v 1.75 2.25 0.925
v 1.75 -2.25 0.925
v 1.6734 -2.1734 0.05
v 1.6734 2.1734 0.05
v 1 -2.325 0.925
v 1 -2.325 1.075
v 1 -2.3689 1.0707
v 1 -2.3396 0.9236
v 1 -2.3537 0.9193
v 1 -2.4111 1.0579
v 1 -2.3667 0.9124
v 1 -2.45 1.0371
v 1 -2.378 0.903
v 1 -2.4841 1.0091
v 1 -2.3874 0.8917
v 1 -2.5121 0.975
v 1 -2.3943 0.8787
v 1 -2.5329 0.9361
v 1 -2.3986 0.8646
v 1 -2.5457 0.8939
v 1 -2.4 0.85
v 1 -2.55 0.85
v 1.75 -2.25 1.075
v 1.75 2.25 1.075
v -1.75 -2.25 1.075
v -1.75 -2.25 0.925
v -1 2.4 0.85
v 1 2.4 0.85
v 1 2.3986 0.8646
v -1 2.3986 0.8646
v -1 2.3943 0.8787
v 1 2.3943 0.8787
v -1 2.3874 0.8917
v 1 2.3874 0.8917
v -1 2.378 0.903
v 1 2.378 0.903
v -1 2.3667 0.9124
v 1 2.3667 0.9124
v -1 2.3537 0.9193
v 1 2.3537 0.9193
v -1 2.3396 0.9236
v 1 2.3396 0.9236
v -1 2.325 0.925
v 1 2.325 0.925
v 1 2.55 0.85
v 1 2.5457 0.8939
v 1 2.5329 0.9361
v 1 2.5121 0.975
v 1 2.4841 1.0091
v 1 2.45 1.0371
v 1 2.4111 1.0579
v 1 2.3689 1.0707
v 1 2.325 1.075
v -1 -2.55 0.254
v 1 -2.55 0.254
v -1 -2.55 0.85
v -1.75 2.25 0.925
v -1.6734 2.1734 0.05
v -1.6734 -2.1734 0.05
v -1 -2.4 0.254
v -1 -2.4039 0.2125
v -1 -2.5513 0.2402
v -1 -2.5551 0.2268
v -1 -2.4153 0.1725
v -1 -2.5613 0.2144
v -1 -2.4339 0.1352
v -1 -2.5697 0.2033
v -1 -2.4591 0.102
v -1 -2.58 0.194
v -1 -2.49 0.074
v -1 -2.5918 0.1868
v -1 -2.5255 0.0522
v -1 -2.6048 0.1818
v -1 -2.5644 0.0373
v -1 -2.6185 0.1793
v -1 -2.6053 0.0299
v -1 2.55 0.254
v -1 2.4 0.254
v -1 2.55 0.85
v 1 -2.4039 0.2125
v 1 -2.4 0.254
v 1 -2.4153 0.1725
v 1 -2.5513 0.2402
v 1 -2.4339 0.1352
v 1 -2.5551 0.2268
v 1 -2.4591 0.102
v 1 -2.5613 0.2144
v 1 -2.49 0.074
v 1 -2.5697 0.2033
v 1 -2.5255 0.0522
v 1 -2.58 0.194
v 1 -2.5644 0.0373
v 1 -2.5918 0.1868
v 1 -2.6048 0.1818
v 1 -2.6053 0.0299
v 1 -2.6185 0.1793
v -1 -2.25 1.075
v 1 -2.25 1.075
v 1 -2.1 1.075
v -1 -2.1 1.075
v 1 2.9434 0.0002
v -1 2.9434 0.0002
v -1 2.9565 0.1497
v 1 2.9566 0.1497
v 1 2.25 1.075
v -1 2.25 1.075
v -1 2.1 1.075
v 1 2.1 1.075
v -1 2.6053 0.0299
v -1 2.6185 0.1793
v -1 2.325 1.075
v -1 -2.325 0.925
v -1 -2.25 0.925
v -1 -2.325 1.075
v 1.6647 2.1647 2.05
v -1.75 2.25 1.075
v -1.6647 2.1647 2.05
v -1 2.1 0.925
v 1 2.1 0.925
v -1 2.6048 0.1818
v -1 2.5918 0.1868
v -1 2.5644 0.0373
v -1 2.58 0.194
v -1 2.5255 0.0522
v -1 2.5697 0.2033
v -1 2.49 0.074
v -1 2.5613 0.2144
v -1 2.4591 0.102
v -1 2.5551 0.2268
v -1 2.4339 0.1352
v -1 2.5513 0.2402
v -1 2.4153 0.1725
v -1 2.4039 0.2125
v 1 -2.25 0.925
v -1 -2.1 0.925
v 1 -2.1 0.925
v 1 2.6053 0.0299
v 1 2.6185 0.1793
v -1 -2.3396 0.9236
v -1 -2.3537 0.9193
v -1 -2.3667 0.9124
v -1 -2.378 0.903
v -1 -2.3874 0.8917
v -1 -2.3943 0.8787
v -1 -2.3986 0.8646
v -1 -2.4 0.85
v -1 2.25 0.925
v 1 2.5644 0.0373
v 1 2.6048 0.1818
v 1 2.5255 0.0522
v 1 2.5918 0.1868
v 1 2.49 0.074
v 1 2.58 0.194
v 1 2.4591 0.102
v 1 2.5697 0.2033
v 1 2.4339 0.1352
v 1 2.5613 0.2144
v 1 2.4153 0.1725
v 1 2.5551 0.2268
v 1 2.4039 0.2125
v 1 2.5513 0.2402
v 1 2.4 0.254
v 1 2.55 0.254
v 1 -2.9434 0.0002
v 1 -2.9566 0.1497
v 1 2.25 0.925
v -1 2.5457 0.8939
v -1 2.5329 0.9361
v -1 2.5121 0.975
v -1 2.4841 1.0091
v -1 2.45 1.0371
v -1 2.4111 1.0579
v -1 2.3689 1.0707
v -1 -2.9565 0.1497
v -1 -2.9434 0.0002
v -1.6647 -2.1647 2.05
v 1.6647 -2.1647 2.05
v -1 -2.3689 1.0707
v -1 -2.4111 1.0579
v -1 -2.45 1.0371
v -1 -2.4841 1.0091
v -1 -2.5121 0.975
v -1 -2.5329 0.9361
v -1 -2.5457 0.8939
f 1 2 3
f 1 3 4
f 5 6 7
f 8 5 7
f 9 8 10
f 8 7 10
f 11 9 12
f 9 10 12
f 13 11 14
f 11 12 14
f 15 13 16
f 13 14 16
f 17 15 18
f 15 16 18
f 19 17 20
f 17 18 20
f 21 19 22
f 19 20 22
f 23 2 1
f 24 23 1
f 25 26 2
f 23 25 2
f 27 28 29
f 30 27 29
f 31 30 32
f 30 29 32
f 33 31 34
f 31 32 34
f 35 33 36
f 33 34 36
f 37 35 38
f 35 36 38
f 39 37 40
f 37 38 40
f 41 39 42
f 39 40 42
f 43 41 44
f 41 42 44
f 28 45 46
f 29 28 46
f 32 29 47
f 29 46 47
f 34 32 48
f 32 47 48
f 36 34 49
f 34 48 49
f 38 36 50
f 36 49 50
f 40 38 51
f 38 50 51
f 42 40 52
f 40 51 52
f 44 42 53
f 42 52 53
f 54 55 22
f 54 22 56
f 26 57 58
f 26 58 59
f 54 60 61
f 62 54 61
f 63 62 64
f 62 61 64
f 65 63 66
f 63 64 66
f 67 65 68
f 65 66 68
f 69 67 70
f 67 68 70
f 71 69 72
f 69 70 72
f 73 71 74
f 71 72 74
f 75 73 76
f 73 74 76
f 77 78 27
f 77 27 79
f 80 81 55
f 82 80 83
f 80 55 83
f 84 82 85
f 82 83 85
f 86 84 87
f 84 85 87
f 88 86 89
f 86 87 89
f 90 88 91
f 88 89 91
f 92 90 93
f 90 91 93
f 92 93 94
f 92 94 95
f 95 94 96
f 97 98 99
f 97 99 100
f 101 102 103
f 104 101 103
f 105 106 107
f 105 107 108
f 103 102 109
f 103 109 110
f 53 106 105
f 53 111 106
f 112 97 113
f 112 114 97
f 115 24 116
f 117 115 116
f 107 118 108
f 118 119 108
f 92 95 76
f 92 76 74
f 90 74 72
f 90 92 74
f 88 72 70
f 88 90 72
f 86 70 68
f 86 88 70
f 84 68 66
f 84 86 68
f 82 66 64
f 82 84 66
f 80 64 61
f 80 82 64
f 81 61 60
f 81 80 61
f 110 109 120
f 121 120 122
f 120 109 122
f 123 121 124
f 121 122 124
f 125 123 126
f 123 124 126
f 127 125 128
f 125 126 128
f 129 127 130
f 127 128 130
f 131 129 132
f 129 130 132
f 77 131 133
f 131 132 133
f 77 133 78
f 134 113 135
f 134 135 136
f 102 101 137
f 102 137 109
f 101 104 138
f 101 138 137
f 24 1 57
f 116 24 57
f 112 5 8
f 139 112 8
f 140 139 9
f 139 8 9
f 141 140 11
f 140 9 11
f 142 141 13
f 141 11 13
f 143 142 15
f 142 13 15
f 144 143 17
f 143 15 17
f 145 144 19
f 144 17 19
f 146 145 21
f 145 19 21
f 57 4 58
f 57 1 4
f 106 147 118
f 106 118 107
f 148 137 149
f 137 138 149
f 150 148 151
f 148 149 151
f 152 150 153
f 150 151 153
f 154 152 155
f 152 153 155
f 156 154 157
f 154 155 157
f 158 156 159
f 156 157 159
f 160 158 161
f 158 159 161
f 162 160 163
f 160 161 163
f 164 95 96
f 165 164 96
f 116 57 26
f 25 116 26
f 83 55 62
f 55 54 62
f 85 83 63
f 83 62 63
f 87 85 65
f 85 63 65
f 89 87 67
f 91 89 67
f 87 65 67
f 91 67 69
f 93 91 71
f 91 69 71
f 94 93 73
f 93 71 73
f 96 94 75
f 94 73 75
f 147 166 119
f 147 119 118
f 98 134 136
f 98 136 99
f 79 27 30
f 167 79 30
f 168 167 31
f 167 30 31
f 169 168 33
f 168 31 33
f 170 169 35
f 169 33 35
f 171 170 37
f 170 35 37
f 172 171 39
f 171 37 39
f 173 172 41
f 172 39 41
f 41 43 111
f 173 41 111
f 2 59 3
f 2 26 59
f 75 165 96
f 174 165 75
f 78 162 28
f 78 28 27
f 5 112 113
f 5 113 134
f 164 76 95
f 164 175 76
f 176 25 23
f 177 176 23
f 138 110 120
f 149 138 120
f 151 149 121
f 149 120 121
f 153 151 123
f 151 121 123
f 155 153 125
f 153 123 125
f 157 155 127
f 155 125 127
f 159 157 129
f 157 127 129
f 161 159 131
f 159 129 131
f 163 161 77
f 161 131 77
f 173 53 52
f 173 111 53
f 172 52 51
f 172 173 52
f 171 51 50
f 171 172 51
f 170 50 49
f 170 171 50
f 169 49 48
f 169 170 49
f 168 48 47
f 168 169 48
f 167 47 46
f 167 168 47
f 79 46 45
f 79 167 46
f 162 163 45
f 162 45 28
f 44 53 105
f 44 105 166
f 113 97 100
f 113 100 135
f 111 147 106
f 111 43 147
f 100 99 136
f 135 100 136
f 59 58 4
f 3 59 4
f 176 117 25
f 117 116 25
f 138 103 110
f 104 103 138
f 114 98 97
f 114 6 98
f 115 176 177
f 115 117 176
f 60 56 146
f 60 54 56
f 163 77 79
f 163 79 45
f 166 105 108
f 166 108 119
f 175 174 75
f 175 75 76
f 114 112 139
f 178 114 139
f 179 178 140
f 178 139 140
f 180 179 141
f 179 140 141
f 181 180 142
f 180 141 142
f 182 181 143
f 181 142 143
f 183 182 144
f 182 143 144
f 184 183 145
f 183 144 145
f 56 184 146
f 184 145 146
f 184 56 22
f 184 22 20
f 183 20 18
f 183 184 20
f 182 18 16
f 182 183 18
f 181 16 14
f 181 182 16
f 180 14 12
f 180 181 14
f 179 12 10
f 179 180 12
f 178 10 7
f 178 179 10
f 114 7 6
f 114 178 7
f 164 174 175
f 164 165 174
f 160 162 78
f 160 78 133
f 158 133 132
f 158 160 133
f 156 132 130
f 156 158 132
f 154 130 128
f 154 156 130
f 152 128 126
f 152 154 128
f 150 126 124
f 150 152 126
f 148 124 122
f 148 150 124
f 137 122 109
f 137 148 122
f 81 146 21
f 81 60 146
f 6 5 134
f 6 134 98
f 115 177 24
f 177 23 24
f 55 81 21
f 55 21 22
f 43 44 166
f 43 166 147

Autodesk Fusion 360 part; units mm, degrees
ref_plane "WorkPlane1" through (0, 0, 0.925) normal (0, 0, 1) x (1, 0, 0)
sketch "Sketch1" plane through (0, 0, 0.925) normal (0, 0, 1) x (1, 0, 0)
  line L0 (1.75, 2.25) -> (-1.75, 2.25)
  line L1 (-1.75, 2.25) -> (-1.75, -2.25)
  line L2 (-1.75, -2.25) -> (1.75, -2.25)
  line L3 (1.75, -2.25) -> (1.75, 2.25)
  line L4 (1.75, 2.25) -> (-1.75, -2.25) construction
  line L5 (-1.75, 2.25) -> (1.75, -2.25) construction
  dimension "d2" = 3.5
  dimension "d3" = 4.5
extrude "Extrude1" add sketch "Sketch1" against normal blind 0.875 draft -5 makes body 1
extrude "Extrude3" add sketch "Sketch1" along normal blind 0.15 bodies 1
extrude "Extrude4" add sketch "Sketch1" along normal blind 0.975 draft -5 from surface at 0.15 bodies 1
sketch "Sketch2" plane through (0, -2.25, 0) normal (0, -1, 0) x (1, 0, 0)
  line L0 (1.4672, 0.1123) -> (1.5, 0.4887)
  line L1 (1, 0.925) -> (-1, 0.925)
  line L2 (-1, 0.925) -> (-1, 1.075)
  line L3 (-1, 1.075) -> (1, 1.075)
  line L4 (1, 1.075) -> (1, 0.925)
  line L5 (1, 0.925) -> (-1, 1.075) construction
  line L6 (-1, 0.925) -> (1, 1.075) construction
  line L7 (-1.75, 0.925) -> (1.75, 0.925)
  line L8 (1.75, 0.925) -> (1.75, 1.075)
  line L9 (1.75, 1.075) -> (-1.75, 1.075)
  line L10 (-1.75, 1.075) -> (-1.75, 0.925)
  point P0 (0, 1)
  dimension "d6" = 2
  dimension "d7" = 0.15
  dimension "d51" = 1
sketch "Sketch3" plane through (0, 0, 0) normal (1, 0, 0) x (0, 1, 0)
  line L0 (-2.25, 1) -> (-2.325, 1)
  arc A0 (-2.325, 1) -> (-2.475, 0.85) centre (-2.325, 0.85) ccw
  line L1 (-2.475, 0.85) -> (-2.475, 0.254)
  arc A1 (-2.6119, 0.1046) -> (-2.475, 0.254) centre (-2.625, 0.254) ccw
  line L2 (-2.6119, 0.1046) -> (-2.95, 0.075)
  line L3 (-2.25, 1.075) -> (-2.25, 0.925)
  line L4 (-2.25, 1) -> (-2.1, 1)
  line L5 (-2.95, 0.075) -> (-2.45, 0.075) construction
  point P0 (-2.25, 1)
  dimension "d10" = 0.15
  dimension "d11" = 0.075
  dimension "d21" = 0.15
  dimension "d22" = 0.225
  dimension "d23" = 0.7
  dimension "d24" = 0.5
  dimension "d25" = 5
  dimension "d26" = 0.15
sweep "Sweep1" add profiles "Sketch2" path "Sketch3" along L2 A1 L1 A0 L0 L4 section 1 contours L1 L2 L3 L4 L7 L9 separate body makes body 2
mirror "Mirror1" about plane through (0, 0, 0) normal (0, 1, 0) of "Sweep1" makes body 3
equation "d1 = tsop2_4_lead_attach - tsop2_4_lead_thickness / 2"
equation "d2 = tsop2_4_package_width"
equation "d3 = tsop2_4_package_depth"
equation "d4 = -tsop2_4_lead_attach + tsop2_4_lead_thickness / 2 + tsop2_4_above_board"
equation "d5 = -tsop2_4_package_taper"
equation "d6 = tsop2_4_lead_width"
equation "d7 = tsop2_4_lead_thickness"
equation "d10 = tsop2_4_lead_thickness"
equation "d11 = tsop2_4_lead_thickness / 2"
equation "tsop2_4_lead_thickness = 0.15 mm"
equation "tsop2_4_lead_attach = 1 mm"
equation "tsop2_4_lead_width = 2 mm"
equation "tsop2_4_lead_spacing = 1 mm"
equation "tsop2_4_package_width = 3.5 mm"
equation "tsop2_4_package_height = 2 mm"
equation "tsop2_4_package_depth = 4.5 mm"
equation "tsop2_4_above_board = 0.05 mm"
equation "d21 = tsop2_4_lead_into_package"
equation "d22 = tsop2_4_lead_thickness * ( 3 / 2 )"
equation "d23 = tsop2_4_lead_extension"
equation "d25 = tsop2_4_lead_foot_angle"
equation "d26 = d10"
equation "tsop2_4_lead_extension = 0.7 mm"
equation "tsop2_4_lead_foot_angle = 5 deg"
equation "tsop2_4_lead_into_package = 0.15 mm"
equation "tsop2_4_optional_lead_extension = 0 mm"
equation "tsop2_4_package_taper = 5 deg"
equation "d46 = tsop2_4_lead_thickness"
equation "d48 = tsop2_4_lead_thickness"
equation "d49 = tsop2_4_package_height - tsop2_4_lead_thickness / 2 - ( tsop2_4_lead_attach - tsop2_4_above_board )"
equation "d50 = -tsop2_4_package_taper"
equation "d51 = tsop2_4_lead_attach"
